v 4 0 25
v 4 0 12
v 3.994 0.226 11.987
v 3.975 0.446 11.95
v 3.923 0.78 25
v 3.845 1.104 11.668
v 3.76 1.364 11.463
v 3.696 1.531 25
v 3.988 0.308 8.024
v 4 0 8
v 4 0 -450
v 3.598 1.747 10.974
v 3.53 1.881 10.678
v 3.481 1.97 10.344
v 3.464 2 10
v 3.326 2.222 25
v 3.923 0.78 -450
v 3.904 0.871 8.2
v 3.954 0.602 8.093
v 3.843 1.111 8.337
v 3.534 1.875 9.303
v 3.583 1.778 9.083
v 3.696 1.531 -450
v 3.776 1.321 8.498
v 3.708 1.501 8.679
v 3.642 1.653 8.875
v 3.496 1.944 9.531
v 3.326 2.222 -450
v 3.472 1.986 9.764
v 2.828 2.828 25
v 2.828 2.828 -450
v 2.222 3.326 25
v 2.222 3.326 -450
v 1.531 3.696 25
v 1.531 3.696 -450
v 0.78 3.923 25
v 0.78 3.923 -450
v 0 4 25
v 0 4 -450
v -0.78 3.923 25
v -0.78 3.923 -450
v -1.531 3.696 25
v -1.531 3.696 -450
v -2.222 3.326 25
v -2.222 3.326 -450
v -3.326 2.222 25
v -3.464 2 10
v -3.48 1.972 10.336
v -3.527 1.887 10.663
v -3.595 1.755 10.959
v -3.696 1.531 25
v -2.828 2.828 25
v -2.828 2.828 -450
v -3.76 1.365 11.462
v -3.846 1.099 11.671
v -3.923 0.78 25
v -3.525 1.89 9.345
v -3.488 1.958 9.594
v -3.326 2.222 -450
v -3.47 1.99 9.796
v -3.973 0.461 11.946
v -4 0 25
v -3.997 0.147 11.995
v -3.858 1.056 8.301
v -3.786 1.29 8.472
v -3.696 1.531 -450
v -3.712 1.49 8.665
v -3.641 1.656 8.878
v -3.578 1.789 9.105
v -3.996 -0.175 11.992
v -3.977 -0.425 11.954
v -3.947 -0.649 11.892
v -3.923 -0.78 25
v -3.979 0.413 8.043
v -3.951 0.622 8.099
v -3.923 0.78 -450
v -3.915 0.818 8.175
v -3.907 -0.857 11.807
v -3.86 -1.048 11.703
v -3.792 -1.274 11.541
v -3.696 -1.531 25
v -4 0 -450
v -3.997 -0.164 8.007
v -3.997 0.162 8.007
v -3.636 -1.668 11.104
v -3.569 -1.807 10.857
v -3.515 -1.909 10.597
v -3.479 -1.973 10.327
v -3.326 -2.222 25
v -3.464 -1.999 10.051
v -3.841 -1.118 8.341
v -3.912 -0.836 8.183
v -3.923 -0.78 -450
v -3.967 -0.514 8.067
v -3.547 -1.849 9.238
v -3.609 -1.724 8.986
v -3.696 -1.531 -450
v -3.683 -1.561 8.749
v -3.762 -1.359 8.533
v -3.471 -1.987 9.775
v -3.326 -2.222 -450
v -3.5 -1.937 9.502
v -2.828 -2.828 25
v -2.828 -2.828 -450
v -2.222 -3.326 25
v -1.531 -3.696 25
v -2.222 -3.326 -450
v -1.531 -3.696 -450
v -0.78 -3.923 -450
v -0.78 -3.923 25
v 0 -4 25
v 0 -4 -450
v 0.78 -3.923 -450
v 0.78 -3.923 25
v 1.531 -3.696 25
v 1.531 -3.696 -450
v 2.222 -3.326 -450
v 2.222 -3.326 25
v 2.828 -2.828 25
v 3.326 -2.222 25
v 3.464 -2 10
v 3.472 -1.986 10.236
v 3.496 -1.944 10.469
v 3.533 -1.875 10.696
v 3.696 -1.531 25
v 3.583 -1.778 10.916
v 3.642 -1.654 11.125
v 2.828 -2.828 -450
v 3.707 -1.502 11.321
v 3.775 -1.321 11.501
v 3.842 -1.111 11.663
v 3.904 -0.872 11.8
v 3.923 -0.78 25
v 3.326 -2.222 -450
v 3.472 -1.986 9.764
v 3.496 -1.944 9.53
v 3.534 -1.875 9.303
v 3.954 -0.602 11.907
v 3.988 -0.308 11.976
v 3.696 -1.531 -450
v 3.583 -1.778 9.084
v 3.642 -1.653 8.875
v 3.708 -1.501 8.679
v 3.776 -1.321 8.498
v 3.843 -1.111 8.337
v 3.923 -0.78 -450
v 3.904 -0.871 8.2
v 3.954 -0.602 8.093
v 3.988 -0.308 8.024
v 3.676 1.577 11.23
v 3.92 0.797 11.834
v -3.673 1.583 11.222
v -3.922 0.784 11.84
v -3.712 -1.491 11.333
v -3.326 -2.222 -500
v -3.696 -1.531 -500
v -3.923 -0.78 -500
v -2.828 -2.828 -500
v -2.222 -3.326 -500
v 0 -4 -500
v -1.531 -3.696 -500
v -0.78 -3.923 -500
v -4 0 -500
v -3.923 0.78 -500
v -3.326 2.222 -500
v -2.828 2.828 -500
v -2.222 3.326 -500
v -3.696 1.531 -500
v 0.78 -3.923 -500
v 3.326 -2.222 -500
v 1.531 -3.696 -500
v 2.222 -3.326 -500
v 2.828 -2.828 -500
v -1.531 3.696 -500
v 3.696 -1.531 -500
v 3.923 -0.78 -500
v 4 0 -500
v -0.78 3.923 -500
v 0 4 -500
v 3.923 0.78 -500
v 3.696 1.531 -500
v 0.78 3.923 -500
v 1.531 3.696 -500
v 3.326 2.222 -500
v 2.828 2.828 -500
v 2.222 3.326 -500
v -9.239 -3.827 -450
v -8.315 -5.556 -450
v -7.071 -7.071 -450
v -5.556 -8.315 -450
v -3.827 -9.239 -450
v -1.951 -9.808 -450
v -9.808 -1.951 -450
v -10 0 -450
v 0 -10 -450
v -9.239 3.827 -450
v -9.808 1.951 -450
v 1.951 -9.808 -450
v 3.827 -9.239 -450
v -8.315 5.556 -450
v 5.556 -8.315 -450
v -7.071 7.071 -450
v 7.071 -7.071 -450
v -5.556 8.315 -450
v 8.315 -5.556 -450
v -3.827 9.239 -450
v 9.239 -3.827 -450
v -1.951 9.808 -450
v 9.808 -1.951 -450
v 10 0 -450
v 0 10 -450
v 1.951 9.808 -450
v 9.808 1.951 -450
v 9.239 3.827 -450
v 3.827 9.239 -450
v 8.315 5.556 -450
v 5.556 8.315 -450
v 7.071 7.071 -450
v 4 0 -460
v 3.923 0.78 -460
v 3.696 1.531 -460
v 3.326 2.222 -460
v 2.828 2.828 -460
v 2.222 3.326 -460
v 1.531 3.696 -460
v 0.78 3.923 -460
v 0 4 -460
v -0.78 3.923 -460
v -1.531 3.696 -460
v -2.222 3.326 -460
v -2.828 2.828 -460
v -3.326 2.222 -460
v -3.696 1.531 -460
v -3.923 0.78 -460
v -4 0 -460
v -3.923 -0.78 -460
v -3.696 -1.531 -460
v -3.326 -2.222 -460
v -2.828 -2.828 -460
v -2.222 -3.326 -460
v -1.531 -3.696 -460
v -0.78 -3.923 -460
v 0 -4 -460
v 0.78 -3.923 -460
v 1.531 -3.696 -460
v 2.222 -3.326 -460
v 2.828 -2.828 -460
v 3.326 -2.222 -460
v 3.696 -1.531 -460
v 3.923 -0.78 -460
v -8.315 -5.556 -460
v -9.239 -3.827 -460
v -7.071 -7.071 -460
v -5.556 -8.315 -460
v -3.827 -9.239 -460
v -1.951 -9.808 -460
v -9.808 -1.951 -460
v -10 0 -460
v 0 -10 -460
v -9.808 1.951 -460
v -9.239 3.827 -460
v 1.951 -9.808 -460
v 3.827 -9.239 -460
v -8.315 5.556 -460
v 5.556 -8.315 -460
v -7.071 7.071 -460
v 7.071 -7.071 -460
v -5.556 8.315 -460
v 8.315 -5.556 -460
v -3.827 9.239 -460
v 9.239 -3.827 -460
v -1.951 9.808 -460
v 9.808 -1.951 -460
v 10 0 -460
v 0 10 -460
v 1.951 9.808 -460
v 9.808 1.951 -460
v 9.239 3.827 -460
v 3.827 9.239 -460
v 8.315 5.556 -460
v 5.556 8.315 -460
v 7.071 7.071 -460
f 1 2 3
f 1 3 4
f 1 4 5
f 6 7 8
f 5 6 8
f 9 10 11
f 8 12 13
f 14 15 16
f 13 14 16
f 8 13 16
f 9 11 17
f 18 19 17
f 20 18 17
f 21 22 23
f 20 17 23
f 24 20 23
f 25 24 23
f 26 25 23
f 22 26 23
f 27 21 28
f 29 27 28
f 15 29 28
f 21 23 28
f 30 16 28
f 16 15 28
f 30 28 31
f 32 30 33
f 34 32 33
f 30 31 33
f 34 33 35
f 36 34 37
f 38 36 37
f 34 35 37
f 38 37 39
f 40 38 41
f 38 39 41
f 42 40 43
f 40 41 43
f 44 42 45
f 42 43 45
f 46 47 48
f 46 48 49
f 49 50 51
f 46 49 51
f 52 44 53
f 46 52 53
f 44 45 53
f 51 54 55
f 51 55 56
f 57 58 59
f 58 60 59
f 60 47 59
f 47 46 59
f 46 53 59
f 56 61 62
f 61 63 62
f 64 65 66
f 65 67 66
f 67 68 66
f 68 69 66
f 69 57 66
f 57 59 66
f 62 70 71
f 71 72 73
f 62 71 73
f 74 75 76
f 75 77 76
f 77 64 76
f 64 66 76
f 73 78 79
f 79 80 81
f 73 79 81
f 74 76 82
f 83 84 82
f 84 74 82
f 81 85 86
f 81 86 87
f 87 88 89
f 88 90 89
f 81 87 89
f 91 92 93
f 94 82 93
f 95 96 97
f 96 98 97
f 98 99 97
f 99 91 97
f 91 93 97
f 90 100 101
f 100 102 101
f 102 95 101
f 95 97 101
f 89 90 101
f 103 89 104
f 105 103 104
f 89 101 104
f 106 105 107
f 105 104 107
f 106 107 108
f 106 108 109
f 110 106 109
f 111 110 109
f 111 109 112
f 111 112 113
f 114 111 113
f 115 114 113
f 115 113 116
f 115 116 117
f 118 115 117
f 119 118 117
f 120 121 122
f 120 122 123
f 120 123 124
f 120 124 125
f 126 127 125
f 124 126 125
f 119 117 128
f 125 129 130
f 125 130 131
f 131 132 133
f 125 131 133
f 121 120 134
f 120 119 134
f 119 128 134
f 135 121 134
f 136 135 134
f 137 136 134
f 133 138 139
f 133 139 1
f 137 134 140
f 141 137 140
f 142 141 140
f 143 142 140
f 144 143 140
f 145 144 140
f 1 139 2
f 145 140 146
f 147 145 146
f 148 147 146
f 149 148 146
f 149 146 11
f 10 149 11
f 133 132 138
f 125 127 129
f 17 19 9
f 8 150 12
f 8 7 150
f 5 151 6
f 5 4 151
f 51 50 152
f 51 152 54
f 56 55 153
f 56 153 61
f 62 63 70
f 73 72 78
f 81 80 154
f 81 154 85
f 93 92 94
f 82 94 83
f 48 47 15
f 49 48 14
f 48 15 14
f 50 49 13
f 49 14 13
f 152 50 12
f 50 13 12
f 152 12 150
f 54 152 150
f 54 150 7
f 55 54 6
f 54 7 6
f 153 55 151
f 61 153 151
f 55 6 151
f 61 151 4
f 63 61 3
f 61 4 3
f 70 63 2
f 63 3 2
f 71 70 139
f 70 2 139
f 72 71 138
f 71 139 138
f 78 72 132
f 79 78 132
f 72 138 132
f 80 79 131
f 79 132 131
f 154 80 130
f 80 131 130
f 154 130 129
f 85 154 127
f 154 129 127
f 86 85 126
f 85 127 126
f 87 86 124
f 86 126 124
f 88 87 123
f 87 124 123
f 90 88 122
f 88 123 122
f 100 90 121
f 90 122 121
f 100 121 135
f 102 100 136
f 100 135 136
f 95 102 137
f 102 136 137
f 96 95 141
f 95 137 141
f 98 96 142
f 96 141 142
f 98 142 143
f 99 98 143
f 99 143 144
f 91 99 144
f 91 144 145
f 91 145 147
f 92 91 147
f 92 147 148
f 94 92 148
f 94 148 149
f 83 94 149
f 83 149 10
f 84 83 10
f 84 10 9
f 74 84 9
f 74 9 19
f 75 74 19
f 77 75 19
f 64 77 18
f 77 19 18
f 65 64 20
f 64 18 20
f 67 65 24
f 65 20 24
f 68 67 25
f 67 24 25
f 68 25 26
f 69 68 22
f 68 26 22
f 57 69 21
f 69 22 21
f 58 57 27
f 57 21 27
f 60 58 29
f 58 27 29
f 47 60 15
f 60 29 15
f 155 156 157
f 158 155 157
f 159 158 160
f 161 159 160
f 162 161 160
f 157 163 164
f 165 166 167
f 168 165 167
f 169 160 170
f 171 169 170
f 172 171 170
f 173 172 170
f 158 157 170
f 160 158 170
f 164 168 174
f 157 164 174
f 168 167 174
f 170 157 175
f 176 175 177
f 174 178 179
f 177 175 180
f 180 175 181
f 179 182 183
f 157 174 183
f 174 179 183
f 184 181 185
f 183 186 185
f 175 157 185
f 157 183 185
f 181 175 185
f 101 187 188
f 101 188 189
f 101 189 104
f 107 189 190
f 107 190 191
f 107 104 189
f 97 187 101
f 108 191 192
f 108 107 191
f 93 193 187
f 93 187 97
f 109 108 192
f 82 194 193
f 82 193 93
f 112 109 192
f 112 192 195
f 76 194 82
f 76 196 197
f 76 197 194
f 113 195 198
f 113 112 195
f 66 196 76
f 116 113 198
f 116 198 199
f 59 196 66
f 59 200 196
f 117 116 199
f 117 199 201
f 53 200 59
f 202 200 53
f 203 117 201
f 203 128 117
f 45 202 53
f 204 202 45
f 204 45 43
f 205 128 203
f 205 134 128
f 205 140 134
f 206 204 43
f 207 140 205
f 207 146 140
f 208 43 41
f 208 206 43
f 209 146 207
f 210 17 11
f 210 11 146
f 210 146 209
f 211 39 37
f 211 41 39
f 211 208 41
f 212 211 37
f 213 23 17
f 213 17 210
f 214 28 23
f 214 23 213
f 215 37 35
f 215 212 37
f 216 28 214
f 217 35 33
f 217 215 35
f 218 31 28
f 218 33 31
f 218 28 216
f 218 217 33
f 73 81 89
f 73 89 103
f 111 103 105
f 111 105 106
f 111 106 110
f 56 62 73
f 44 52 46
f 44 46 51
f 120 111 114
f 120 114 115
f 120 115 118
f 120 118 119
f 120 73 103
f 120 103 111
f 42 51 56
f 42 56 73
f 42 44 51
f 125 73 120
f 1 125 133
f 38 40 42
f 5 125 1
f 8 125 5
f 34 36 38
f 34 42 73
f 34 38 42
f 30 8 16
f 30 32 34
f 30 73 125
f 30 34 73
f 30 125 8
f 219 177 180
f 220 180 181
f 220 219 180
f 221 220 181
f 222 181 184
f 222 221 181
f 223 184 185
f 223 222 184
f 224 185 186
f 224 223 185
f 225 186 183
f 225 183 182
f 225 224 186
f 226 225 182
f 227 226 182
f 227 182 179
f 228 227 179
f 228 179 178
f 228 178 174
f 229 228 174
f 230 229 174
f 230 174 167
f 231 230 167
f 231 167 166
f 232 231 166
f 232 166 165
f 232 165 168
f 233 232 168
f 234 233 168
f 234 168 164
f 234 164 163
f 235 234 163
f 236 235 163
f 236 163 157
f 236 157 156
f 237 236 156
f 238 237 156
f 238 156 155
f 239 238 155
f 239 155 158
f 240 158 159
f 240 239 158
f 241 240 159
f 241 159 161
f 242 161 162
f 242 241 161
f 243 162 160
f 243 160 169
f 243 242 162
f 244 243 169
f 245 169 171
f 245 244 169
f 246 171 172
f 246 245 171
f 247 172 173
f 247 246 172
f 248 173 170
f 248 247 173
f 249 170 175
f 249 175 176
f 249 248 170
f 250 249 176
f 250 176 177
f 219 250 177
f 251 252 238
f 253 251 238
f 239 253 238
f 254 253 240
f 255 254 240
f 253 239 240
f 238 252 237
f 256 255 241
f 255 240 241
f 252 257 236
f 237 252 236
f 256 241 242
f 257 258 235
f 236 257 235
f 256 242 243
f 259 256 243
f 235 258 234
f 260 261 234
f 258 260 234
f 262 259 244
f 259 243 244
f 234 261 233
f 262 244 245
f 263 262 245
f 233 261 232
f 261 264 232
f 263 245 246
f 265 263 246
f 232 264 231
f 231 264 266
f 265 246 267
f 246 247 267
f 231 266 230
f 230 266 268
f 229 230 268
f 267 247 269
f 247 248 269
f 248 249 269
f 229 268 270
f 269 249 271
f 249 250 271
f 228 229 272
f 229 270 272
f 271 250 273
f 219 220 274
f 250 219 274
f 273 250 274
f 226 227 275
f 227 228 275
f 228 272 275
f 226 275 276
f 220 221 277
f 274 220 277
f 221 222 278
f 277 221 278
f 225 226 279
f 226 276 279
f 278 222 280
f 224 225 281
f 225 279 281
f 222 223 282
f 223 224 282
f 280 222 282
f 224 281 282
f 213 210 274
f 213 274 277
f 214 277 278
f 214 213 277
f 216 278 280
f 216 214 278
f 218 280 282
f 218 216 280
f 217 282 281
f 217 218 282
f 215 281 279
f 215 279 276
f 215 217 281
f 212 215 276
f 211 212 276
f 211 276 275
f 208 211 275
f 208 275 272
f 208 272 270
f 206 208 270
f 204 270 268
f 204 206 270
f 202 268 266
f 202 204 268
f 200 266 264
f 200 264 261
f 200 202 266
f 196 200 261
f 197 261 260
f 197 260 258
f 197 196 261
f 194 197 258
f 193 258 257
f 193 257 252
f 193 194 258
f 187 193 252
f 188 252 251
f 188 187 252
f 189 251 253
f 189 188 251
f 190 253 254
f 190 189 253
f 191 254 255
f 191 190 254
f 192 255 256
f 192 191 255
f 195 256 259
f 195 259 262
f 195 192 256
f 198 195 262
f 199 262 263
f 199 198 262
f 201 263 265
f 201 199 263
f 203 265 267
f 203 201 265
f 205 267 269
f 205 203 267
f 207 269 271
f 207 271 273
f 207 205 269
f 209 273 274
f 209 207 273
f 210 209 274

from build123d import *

# Parameters (mm, degrees)
F0_R     = 4
F1_DEPTH = 500
F3_START = -450
F2_R     = 10
F2_R_2   = 4
F3_DEPTH = 10
F4_DEPTH = 25
F5_R     = 2
F6_DEPTH = 12.5


with BuildPart() as f1:
    # F0 (on Top) → F1 (new body)
    with BuildSketch(Plane.XY):
        Circle(F0_R)
    extrude(amount=-F1_DEPTH)

    # F2 (on Top) → F3 (join)
    with BuildSketch(Plane.XY.offset(F3_START)):
        Circle(F2_R)
        Circle(F2_R_2, mode=Mode.SUBTRACT)
    extrude(amount=-F3_DEPTH)

    # F0 (on Top) → F4 (join)
    with BuildSketch(Plane.XY):
        Circle(F0_R)
    extrude(amount=F4_DEPTH)

    # F5 (on Right) → F6 (cut, symmetric)
    with BuildSketch(Plane.YZ):
        with Locations((0, 10)):
            Circle(F5_R)
    extrude(amount=F6_DEPTH, both=True, mode=Mode.SUBTRACT)


solid = f1.part
